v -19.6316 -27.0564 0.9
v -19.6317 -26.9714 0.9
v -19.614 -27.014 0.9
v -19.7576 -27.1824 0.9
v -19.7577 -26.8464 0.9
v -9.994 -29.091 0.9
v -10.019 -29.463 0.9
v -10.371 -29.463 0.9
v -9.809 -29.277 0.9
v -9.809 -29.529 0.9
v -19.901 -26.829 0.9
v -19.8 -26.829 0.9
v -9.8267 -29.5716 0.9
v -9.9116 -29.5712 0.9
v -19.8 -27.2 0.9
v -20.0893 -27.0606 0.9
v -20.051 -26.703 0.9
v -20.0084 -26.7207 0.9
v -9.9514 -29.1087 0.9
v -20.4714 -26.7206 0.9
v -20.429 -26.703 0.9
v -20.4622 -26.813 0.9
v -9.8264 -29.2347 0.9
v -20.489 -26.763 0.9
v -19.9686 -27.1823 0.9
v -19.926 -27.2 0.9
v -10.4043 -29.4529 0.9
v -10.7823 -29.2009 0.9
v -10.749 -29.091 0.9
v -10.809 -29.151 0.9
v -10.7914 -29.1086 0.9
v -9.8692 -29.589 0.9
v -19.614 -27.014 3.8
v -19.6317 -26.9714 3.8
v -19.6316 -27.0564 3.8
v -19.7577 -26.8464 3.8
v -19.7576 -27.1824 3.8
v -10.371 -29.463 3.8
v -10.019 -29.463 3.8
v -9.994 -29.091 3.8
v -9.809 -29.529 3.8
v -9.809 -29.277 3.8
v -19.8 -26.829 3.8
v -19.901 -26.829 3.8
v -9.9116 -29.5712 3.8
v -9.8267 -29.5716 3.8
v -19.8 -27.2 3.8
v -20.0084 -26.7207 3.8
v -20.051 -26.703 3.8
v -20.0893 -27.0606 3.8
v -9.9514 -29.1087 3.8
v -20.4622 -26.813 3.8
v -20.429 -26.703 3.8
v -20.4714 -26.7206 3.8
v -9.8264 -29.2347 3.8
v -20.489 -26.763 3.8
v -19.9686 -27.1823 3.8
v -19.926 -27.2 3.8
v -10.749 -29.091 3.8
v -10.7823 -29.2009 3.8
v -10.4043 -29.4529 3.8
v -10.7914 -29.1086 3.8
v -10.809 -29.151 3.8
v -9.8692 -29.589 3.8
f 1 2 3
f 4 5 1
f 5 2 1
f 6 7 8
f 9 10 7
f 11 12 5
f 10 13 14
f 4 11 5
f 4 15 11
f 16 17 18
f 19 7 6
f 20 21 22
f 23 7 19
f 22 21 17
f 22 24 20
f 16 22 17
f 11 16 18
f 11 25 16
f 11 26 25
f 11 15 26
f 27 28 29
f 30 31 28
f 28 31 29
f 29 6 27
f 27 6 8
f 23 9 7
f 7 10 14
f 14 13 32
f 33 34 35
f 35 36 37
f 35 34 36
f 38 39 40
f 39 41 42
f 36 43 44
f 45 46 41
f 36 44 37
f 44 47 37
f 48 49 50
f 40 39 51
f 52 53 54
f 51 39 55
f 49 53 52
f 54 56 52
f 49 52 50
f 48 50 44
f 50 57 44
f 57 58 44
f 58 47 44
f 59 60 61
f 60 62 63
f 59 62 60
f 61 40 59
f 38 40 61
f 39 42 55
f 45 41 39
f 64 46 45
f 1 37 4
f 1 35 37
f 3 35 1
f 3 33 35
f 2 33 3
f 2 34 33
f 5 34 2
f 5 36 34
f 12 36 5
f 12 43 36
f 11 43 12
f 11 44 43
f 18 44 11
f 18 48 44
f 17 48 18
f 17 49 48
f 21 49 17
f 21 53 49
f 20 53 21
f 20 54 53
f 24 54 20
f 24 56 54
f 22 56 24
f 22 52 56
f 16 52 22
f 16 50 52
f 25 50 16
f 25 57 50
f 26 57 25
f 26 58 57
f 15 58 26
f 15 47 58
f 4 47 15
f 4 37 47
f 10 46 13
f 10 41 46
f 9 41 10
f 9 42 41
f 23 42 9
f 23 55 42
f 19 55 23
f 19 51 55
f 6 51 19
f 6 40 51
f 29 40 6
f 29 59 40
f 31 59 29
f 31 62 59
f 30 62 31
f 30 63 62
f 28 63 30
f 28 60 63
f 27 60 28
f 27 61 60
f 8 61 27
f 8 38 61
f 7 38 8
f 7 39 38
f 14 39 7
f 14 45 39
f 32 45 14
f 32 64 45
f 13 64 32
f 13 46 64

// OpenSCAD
$fn = 24;
translate([0, -2.500, 0.900])
  linear_extrude(height=2.900) {
offset(r=0.06, $fn=8) {
    polygon(points=[[-10.874,-26.651],[-10.749,-26.651],[-10.371,-26.903],[-9.994,-26.903],[-9.869,-27.029],[-9.869,-26.777],[-9.994,-26.651]], paths=[[0,1,2,3,4,5,6]]);
    polygon(points=[[-19.674,-24.263],[-19.800,-24.389],[-19.926,-24.389],[-20.051,-24.263],[-19.926,-24.137],[-20.051,-24.263],[-20.429,-24.263],[-20.051,-24.514],[-20.177,-24.640],[-20.051,-24.514],[-19.926,-24.640],[-19.800,-24.640],[-19.674,-24.514],[-19.800,-24.389]], paths=[[0,1,2,3,4,5,6,7,8,9,10,11,12,13]]);
}
}
